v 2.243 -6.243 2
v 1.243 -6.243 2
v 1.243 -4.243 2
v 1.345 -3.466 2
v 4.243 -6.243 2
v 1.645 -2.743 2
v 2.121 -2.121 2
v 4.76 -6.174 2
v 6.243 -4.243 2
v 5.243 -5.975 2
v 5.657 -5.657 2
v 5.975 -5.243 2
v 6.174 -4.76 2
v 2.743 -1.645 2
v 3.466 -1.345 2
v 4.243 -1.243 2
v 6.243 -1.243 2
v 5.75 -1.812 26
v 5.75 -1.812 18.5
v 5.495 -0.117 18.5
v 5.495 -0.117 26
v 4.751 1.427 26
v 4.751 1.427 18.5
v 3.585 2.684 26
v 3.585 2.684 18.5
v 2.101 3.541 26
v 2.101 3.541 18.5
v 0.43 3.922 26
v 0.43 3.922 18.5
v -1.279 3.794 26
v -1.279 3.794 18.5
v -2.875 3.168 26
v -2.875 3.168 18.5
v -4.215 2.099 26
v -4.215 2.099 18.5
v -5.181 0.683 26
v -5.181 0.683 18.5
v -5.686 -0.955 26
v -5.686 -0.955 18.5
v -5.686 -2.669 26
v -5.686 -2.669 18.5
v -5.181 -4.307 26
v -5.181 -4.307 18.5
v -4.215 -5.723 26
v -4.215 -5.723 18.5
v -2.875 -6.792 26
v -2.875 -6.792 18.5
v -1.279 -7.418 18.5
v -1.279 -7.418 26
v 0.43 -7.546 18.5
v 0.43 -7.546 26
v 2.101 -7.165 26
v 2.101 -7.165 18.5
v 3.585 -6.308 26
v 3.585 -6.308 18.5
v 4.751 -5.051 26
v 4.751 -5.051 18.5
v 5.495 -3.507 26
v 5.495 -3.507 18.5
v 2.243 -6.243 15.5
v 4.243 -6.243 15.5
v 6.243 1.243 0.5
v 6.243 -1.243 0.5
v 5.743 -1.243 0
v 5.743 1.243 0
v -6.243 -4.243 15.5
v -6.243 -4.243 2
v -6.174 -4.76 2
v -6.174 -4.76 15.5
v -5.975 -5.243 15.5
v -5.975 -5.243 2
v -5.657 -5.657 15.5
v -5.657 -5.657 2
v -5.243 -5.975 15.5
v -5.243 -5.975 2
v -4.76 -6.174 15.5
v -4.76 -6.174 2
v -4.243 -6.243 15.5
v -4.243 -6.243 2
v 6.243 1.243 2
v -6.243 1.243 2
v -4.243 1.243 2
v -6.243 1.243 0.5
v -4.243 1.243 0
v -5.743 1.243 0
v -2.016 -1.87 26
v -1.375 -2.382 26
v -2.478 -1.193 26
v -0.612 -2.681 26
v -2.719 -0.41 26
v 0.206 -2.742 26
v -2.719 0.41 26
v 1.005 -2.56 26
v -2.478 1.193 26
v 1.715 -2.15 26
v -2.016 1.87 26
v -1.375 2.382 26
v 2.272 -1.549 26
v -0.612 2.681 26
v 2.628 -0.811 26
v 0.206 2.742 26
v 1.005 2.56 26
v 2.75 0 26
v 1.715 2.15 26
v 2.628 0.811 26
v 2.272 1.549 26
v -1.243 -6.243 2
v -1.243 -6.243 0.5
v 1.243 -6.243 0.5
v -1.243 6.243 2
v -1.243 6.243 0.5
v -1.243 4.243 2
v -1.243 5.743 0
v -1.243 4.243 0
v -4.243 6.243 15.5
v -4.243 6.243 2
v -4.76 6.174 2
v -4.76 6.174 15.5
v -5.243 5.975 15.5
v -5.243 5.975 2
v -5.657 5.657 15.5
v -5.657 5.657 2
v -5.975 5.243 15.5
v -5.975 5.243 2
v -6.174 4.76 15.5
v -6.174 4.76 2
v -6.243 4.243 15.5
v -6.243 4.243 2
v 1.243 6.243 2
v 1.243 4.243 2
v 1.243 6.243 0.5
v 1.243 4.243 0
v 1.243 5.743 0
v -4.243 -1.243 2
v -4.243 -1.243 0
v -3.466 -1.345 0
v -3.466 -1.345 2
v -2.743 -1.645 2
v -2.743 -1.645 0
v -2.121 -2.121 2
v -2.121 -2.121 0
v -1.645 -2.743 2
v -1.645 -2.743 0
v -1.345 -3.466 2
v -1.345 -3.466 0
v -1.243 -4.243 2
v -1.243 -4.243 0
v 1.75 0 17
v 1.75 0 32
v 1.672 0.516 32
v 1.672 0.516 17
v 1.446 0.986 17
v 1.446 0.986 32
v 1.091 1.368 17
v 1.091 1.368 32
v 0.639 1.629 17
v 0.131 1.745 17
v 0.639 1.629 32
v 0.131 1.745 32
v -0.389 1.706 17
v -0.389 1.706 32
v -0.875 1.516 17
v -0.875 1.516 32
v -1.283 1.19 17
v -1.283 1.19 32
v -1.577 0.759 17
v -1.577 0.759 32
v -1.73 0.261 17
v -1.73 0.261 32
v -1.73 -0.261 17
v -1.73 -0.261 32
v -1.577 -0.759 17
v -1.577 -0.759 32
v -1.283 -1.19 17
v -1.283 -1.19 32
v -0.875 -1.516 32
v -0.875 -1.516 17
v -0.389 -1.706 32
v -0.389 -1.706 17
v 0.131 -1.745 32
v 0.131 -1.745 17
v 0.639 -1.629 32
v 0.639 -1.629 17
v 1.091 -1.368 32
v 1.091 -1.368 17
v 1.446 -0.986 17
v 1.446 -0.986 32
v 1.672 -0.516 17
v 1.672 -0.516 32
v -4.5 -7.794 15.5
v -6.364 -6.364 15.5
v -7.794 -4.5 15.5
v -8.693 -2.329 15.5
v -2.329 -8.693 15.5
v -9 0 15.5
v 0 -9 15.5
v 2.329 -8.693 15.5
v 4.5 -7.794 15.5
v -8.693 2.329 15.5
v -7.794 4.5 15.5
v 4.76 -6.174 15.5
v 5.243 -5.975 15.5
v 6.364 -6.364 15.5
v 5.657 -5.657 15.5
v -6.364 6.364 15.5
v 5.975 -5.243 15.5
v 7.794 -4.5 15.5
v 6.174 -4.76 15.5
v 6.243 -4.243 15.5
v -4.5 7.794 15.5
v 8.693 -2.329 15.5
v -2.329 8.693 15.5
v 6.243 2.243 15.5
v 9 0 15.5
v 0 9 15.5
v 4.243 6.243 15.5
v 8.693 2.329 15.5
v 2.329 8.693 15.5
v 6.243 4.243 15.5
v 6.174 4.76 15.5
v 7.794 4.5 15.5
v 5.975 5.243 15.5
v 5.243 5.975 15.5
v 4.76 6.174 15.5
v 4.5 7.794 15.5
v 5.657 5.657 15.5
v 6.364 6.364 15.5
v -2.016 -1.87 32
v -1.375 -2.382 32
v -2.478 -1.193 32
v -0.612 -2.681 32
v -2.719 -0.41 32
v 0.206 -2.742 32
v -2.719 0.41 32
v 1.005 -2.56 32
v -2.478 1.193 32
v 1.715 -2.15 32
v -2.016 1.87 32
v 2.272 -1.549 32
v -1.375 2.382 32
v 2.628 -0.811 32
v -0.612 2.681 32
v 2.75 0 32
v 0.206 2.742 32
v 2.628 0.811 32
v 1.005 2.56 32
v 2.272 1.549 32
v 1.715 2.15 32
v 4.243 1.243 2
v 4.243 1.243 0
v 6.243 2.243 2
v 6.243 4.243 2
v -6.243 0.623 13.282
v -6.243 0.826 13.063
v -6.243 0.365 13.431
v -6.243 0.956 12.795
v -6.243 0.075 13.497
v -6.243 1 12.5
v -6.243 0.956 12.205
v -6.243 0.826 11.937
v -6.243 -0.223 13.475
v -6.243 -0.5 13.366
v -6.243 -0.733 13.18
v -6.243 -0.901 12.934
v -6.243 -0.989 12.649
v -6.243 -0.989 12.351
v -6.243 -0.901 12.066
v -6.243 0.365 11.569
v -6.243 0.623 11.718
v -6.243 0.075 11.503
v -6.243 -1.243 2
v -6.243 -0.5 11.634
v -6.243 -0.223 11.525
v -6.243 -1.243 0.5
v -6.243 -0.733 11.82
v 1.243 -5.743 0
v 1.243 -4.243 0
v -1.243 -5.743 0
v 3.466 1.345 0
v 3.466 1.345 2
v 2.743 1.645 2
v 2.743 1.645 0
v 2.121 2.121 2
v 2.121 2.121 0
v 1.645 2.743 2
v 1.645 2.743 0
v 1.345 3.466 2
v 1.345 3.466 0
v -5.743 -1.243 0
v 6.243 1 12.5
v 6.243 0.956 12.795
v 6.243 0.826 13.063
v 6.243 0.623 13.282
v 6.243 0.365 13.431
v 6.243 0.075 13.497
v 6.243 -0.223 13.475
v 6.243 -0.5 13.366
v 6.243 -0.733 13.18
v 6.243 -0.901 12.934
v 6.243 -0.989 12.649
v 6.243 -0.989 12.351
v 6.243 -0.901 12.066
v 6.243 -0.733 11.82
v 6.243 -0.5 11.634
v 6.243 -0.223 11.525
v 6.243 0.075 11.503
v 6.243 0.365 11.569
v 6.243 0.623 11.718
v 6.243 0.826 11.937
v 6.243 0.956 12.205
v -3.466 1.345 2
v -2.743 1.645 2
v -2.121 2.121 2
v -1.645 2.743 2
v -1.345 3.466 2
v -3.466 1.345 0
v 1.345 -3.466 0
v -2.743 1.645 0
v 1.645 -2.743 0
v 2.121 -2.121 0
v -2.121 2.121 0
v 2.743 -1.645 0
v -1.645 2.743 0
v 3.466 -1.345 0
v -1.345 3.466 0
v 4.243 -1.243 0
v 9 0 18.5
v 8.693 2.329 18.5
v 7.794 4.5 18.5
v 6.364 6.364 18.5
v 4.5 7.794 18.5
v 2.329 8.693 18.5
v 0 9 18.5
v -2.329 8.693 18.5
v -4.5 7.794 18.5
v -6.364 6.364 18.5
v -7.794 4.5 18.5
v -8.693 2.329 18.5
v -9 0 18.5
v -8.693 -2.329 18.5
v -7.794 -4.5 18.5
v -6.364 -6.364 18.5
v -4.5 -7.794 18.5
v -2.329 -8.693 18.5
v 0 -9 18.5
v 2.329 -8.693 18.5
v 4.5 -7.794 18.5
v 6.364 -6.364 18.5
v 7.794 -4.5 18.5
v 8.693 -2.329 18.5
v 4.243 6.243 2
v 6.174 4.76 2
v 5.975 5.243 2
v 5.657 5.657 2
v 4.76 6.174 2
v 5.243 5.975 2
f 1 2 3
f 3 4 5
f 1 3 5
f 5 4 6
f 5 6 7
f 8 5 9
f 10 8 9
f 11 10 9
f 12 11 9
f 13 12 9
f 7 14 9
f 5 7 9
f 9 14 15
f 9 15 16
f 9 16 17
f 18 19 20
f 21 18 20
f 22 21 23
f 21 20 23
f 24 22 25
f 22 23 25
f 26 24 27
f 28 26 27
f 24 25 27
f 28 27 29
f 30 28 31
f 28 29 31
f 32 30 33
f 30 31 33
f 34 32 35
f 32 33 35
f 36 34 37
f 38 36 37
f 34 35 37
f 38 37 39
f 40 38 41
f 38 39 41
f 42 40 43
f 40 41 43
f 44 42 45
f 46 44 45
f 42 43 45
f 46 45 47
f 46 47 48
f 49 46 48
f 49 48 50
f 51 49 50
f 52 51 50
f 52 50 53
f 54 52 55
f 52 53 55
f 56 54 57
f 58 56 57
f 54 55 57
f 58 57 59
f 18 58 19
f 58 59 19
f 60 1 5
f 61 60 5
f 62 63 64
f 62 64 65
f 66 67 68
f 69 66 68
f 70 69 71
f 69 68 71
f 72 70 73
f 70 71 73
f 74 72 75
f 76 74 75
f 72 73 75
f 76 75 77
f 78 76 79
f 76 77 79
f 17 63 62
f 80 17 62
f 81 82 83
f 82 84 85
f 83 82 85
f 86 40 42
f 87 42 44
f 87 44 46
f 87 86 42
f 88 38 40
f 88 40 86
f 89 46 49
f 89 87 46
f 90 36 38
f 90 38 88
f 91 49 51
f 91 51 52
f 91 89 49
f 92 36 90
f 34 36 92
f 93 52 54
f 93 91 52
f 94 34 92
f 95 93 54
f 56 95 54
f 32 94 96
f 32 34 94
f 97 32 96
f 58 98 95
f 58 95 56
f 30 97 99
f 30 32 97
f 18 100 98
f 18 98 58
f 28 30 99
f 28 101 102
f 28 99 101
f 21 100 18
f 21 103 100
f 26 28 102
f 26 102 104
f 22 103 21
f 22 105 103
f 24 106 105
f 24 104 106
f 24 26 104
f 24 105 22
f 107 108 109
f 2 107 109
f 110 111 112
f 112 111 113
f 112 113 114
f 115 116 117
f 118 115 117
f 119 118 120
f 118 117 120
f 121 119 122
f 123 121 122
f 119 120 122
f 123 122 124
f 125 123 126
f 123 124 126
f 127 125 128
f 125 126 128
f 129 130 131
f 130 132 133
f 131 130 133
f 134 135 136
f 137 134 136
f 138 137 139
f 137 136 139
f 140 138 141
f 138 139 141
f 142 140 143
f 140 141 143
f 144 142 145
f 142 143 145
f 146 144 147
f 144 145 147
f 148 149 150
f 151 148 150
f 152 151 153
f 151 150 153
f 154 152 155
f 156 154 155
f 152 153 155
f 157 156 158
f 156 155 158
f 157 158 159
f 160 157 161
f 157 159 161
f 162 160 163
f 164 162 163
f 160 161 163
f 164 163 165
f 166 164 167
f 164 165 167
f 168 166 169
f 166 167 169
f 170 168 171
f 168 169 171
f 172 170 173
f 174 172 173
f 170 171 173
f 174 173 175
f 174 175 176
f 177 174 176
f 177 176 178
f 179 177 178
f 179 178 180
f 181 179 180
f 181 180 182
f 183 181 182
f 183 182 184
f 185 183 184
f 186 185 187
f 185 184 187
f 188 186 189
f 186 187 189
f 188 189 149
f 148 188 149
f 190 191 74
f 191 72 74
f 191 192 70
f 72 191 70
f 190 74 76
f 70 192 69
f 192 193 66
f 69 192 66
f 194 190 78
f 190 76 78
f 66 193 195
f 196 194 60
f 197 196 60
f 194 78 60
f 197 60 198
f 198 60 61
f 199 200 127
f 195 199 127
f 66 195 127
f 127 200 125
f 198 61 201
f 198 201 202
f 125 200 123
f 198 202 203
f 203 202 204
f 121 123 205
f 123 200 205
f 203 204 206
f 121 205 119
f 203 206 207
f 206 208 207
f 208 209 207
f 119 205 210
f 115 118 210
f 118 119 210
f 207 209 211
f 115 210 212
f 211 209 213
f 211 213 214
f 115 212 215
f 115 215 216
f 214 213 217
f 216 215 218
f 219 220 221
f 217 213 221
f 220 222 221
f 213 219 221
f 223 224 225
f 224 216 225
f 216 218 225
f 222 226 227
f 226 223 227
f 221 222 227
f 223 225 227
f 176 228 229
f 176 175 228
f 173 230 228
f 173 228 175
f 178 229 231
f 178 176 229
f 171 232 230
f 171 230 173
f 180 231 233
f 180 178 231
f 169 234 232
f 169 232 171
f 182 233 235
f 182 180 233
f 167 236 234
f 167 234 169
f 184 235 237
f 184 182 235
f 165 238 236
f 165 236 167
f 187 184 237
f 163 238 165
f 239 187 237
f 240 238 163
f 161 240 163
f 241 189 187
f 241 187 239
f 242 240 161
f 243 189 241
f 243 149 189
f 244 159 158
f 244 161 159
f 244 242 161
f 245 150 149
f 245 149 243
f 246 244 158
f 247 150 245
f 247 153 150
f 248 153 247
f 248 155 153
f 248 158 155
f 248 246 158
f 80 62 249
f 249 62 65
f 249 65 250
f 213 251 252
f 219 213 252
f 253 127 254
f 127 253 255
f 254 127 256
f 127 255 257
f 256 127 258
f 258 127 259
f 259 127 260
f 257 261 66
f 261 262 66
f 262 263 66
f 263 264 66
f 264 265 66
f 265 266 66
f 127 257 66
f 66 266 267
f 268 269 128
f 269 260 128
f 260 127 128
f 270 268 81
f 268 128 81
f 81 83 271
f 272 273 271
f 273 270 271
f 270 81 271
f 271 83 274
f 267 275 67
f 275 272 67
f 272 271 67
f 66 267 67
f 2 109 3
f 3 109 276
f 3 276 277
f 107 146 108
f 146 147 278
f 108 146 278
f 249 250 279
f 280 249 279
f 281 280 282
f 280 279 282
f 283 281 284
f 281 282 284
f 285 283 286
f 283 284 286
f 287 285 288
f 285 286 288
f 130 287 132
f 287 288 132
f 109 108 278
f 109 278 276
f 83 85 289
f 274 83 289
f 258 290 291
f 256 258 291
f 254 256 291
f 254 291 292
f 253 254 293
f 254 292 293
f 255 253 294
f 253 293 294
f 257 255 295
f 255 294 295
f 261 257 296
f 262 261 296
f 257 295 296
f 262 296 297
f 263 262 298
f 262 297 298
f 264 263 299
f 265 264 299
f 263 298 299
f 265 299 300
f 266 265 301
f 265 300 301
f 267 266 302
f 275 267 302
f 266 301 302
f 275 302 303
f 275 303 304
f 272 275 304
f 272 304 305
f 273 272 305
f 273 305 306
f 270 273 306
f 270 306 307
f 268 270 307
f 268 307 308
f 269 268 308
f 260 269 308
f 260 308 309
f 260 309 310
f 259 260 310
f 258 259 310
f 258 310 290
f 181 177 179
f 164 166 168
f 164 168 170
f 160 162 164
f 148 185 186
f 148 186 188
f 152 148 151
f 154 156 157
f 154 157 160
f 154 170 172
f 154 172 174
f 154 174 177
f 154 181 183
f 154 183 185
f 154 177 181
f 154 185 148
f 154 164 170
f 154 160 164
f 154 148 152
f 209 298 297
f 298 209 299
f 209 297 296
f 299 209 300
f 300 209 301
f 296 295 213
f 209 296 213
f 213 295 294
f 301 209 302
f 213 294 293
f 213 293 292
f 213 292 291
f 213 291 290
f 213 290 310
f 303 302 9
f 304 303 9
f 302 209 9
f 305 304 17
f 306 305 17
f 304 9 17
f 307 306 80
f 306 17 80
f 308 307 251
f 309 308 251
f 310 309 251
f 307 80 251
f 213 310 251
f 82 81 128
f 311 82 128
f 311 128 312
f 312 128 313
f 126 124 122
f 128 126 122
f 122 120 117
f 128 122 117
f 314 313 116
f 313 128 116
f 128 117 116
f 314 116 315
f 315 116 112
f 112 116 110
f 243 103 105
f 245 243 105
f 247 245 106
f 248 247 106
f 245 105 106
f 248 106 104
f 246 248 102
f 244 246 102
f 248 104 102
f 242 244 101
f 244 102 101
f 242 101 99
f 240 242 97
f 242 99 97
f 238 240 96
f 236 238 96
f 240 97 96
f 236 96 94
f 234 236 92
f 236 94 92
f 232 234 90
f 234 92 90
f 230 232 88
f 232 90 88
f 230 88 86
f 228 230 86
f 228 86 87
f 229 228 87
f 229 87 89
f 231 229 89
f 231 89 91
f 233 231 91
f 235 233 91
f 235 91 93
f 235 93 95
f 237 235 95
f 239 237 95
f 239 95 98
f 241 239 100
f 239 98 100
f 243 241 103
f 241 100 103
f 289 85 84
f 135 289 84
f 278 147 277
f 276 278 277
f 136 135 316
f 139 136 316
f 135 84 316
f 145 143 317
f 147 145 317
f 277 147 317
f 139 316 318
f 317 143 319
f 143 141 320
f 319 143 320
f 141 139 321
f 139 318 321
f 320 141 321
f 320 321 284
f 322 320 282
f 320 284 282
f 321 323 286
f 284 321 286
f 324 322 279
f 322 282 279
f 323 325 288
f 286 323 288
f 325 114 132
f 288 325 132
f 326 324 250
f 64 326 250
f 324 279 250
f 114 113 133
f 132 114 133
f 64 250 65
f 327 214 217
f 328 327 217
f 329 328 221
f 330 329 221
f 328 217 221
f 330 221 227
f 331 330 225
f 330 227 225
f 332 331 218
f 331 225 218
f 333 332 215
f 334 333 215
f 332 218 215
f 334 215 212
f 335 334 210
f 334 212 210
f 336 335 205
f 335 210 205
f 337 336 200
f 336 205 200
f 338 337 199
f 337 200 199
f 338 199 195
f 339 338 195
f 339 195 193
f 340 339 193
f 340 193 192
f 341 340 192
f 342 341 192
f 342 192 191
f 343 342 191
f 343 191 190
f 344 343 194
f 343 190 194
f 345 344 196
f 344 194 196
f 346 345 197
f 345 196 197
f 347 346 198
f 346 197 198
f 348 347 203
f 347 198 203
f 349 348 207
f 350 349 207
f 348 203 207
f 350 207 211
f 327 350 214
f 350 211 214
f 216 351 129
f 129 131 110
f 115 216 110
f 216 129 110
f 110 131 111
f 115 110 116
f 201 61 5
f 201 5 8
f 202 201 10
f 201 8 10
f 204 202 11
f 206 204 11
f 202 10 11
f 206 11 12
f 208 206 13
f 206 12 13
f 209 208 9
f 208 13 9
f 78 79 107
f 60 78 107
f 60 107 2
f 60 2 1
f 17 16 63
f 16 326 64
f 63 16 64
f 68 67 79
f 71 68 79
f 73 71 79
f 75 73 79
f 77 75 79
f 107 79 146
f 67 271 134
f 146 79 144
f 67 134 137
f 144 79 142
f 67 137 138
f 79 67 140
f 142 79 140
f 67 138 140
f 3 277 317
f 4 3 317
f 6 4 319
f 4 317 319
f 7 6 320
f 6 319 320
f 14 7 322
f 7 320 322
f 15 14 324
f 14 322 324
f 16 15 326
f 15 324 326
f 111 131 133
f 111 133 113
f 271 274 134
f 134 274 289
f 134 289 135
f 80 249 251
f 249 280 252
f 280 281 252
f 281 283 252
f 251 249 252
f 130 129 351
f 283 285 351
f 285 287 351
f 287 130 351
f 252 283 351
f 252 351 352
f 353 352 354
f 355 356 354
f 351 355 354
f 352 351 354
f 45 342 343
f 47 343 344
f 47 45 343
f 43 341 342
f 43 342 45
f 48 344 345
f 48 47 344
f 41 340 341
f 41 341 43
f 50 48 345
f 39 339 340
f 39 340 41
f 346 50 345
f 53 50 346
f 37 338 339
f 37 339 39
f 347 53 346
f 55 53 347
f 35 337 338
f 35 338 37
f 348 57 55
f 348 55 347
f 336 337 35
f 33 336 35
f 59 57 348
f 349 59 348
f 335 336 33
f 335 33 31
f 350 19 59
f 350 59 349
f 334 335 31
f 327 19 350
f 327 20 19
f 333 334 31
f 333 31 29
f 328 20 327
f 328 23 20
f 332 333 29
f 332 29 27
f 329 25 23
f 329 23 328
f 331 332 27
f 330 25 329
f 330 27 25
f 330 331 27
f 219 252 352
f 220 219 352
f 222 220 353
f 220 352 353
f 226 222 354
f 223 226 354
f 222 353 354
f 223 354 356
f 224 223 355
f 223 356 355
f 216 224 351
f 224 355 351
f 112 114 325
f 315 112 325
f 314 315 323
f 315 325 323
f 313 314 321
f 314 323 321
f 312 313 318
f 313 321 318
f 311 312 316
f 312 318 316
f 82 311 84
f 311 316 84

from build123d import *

# Parameters (mm, degrees)
BOSS_EXTRUDE3_START = 5.5
SKETCH3_R           = 9
BOSS_EXTRUDE3_DEPTH = 3
SKETCH4_R           = 5.75
BOSS_EXTRUDE4_DEPTH = 7.5
SKETCH5_R           = 2.75
BOSS_EXTRUDE5_DEPTH = 6
BOSS_EXTRUDE8_DEPTH = 2
BOSS_EXTRUDE9_START = 2
BOSS_EXTRUDE9_DEPTH = 13.5
SKETCH6_R           = 1
CUT_EXTRUDE1_DEPTH  = 15
CHAMFER1_SIZE       = 0.5
SKETCH7_R           = 1.75
CUT_EXTRUDE2_DEPTH  = 15


with BuildPart() as part:
    # Sketch3 → Boss-Extrude3 (new body)
    with BuildSketch(Plane.XY.offset(10).offset(BOSS_EXTRUDE3_START)):
        Circle(SKETCH3_R)
    extrude(amount=BOSS_EXTRUDE3_DEPTH)

    # Sketch4 → Boss-Extrude4 (add)
    with BuildSketch(Plane.XY.offset(18.5)):
        with Locations((0, -1.812)):
            Circle(SKETCH4_R)
    extrude(amount=BOSS_EXTRUDE4_DEPTH)

    # Sketch5 → Boss-Extrude5 (add)
    with BuildSketch(Plane.XY.offset(26)):
        Circle(SKETCH5_R)
    extrude(amount=BOSS_EXTRUDE5_DEPTH)



with BuildPart() as body_2:
    # Sketch1 → Boss-Extrude8 (new body)
    with BuildSketch(Plane.XY):
        with BuildLine():
            Line((1.242640687, 4.242640687), (1.242640687, 6.242640687))
            Line((1.242640687, 6.242640687), (-1.242640687, 6.242640687))
            Line((-1.242640687, 6.242640687), (-1.242640687, 4.242640687))
            ThreePointArc((-1.242640687, 4.242640687), (-2.121320344, 2.121320343), (-4.242640687, 1.242640687))
            Line((-4.242640687, 1.242640687), (-6.242640687, 1.242640687))
            Line((-6.242640687, 1.242640687), (-6.242640687, -1.242640687))
            Line((-6.242640687, -1.242640687), (-4.242640687, -1.242640687))
            ThreePointArc((-4.242640687, -1.242640687), (-2.121320343, -2.121320344), (-1.242640687, -4.242640687))
            Line((-1.242640687, -4.242640687), (-1.242640687, -6.242640687))
            Line((-1.242640687, -6.242640687), (1.242640687, -6.242640687))
            Line((1.242640687, -6.242640687), (1.242640687, -4.242640687))
            ThreePointArc((1.242640687, -4.242640687), (2.121320344, -2.121320343), (4.242640687, -1.242640687))
            Line((4.242640687, -1.242640687), (6.242640687, -1.242640687))
            Line((6.242640687, -1.242640687), (6.242640687, 1.242640687))
            Line((6.242640687, 1.242640687), (4.242640687, 1.242640687))
            ThreePointArc((4.242640687, 1.242640687), (2.121320343, 2.121320344), (1.242640687, 4.242640687))
        make_face()
    extrude(amount=BOSS_EXTRUDE8_DEPTH)


with BuildPart() as part_1:
    add(part.part)

    add(body_2.part)  # Boss-Extrude9 merges body 2
    # Sketch1<7> → Boss-Extrude9 (add)
    with BuildSketch(Plane.XY.offset(BOSS_EXTRUDE9_START)):
        with BuildLine():
            Line((4.242640687, 6.242640687), (-4.242640687, 6.242640687))
            ThreePointArc((-4.242640687, 6.242640687), (-5.656854249, 5.656854249), (-6.242640687, 4.242640687))
            Line((-6.242640687, 4.242640687), (-6.242640687, -4.242640687))
            ThreePointArc((-6.242640687, -4.242640687), (-5.656854249, -5.656854249), (-4.242640687, -6.242640686))
            Line((-4.242640687, -6.242640687), (4.242640687, -6.242640687))
            ThreePointArc((4.242640687, -6.242640686), (5.656854249, -5.656854249), (6.242640686, -4.242640687))
            Line((6.242640687, -4.242640687), (6.242640687, 4.242640687))
            ThreePointArc((6.242640687, 4.242640687), (5.656854249, 5.656854249), (4.242640687, 6.242640687))
        make_face()
    extrude(amount=BOSS_EXTRUDE9_DEPTH)

    # Sketch6 → Cut-Extrude1 (cut)
    with BuildSketch(Plane(origin=(6.242640687, 0, 0), x_dir=(0, 0, -1), z_dir=(1, 0, 0))):
        with Locations((-12.5, 0)):
            Circle(SKETCH6_R)
    extrude(amount=-CUT_EXTRUDE1_DEPTH, mode=Mode.SUBTRACT)

    # Chamfer1
    chamfer1_edges = [part_1.edges().sort_by_distance(p)[0] for p in [
        (0, -6.242640687, 0),
        (6.242640687, 0, 0),
        (-6.242640687, 0, 0),
        (0, 6.242640687, 0),
    ]]
    chamfer(chamfer1_edges, length=CHAMFER1_SIZE)

    # Sketch7 → Cut-Extrude2 (cut)
    with BuildSketch(Plane.XY.offset(32)):
        Circle(SKETCH7_R)
    extrude(amount=-CUT_EXTRUDE2_DEPTH, mode=Mode.SUBTRACT)


solid = part_1.part
